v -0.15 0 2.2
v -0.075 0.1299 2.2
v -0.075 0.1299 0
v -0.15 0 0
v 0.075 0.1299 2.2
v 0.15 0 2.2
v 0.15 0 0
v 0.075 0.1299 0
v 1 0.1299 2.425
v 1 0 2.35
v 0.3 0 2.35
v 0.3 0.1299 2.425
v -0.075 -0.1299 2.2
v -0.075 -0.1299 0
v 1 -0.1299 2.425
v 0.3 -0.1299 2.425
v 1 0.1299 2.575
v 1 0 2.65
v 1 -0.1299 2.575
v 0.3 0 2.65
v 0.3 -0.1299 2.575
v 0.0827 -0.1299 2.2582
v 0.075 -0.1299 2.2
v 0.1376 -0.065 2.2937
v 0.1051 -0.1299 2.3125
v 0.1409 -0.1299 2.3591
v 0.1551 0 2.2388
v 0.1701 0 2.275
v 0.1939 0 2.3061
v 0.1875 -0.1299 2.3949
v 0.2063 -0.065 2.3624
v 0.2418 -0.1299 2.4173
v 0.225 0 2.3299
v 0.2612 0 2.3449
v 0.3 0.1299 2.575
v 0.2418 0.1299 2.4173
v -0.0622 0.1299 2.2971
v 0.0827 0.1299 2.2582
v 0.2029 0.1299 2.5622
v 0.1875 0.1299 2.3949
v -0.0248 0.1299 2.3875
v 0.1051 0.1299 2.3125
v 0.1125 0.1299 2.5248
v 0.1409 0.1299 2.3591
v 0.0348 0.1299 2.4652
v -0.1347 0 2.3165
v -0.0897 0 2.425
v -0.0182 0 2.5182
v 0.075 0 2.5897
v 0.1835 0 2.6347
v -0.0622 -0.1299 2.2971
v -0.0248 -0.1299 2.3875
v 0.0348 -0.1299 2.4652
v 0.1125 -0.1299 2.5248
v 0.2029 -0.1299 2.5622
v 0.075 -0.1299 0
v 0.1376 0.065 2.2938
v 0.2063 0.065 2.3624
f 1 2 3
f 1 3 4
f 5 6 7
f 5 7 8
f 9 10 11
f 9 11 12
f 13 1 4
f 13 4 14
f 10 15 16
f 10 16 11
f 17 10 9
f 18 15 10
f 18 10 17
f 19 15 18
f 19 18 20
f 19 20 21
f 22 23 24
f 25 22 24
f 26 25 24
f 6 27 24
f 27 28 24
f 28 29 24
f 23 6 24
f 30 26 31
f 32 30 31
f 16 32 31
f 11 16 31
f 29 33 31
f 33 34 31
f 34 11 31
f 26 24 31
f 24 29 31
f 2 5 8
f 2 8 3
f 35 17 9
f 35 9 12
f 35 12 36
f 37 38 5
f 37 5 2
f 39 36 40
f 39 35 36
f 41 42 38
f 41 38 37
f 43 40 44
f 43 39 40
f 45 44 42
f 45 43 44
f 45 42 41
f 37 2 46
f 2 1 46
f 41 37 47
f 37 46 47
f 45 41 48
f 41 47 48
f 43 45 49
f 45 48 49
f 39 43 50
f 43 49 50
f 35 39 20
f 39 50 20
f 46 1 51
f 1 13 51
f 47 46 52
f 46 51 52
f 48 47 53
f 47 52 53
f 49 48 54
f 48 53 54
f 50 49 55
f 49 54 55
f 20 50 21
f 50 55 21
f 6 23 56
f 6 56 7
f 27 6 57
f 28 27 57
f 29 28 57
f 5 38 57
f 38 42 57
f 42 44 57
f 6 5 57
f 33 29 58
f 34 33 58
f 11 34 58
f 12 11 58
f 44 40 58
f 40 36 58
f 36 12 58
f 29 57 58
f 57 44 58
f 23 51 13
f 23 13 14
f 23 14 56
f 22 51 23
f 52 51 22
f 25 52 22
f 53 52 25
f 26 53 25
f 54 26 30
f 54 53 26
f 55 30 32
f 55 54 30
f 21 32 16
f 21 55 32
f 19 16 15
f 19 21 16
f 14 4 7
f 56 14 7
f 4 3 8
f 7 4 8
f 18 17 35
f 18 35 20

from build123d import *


with BuildPart() as f2:
    # F2: sweep along a path in F0
    with BuildLine(Plane.XZ) as f2_path:
        Line((0, 0), (0, 2.2))
        ThreePointArc((0, 2.2), (0.087868, 2.412132), (0.3, 2.5))
        Line((0.3, 2.5), (1, 2.5))
    # F1 (on Top) → F2 (sweep)
    with BuildSketch(Plane.XY):
        Polygon((0.075, 0.129904), (-0.075, 0.129904), (-0.15, 0), (-0.075, -0.129904), (0.075, -0.129904), (0.15, 0), align=None)
    sweep(path=f2_path.line)


solid = f2.part
